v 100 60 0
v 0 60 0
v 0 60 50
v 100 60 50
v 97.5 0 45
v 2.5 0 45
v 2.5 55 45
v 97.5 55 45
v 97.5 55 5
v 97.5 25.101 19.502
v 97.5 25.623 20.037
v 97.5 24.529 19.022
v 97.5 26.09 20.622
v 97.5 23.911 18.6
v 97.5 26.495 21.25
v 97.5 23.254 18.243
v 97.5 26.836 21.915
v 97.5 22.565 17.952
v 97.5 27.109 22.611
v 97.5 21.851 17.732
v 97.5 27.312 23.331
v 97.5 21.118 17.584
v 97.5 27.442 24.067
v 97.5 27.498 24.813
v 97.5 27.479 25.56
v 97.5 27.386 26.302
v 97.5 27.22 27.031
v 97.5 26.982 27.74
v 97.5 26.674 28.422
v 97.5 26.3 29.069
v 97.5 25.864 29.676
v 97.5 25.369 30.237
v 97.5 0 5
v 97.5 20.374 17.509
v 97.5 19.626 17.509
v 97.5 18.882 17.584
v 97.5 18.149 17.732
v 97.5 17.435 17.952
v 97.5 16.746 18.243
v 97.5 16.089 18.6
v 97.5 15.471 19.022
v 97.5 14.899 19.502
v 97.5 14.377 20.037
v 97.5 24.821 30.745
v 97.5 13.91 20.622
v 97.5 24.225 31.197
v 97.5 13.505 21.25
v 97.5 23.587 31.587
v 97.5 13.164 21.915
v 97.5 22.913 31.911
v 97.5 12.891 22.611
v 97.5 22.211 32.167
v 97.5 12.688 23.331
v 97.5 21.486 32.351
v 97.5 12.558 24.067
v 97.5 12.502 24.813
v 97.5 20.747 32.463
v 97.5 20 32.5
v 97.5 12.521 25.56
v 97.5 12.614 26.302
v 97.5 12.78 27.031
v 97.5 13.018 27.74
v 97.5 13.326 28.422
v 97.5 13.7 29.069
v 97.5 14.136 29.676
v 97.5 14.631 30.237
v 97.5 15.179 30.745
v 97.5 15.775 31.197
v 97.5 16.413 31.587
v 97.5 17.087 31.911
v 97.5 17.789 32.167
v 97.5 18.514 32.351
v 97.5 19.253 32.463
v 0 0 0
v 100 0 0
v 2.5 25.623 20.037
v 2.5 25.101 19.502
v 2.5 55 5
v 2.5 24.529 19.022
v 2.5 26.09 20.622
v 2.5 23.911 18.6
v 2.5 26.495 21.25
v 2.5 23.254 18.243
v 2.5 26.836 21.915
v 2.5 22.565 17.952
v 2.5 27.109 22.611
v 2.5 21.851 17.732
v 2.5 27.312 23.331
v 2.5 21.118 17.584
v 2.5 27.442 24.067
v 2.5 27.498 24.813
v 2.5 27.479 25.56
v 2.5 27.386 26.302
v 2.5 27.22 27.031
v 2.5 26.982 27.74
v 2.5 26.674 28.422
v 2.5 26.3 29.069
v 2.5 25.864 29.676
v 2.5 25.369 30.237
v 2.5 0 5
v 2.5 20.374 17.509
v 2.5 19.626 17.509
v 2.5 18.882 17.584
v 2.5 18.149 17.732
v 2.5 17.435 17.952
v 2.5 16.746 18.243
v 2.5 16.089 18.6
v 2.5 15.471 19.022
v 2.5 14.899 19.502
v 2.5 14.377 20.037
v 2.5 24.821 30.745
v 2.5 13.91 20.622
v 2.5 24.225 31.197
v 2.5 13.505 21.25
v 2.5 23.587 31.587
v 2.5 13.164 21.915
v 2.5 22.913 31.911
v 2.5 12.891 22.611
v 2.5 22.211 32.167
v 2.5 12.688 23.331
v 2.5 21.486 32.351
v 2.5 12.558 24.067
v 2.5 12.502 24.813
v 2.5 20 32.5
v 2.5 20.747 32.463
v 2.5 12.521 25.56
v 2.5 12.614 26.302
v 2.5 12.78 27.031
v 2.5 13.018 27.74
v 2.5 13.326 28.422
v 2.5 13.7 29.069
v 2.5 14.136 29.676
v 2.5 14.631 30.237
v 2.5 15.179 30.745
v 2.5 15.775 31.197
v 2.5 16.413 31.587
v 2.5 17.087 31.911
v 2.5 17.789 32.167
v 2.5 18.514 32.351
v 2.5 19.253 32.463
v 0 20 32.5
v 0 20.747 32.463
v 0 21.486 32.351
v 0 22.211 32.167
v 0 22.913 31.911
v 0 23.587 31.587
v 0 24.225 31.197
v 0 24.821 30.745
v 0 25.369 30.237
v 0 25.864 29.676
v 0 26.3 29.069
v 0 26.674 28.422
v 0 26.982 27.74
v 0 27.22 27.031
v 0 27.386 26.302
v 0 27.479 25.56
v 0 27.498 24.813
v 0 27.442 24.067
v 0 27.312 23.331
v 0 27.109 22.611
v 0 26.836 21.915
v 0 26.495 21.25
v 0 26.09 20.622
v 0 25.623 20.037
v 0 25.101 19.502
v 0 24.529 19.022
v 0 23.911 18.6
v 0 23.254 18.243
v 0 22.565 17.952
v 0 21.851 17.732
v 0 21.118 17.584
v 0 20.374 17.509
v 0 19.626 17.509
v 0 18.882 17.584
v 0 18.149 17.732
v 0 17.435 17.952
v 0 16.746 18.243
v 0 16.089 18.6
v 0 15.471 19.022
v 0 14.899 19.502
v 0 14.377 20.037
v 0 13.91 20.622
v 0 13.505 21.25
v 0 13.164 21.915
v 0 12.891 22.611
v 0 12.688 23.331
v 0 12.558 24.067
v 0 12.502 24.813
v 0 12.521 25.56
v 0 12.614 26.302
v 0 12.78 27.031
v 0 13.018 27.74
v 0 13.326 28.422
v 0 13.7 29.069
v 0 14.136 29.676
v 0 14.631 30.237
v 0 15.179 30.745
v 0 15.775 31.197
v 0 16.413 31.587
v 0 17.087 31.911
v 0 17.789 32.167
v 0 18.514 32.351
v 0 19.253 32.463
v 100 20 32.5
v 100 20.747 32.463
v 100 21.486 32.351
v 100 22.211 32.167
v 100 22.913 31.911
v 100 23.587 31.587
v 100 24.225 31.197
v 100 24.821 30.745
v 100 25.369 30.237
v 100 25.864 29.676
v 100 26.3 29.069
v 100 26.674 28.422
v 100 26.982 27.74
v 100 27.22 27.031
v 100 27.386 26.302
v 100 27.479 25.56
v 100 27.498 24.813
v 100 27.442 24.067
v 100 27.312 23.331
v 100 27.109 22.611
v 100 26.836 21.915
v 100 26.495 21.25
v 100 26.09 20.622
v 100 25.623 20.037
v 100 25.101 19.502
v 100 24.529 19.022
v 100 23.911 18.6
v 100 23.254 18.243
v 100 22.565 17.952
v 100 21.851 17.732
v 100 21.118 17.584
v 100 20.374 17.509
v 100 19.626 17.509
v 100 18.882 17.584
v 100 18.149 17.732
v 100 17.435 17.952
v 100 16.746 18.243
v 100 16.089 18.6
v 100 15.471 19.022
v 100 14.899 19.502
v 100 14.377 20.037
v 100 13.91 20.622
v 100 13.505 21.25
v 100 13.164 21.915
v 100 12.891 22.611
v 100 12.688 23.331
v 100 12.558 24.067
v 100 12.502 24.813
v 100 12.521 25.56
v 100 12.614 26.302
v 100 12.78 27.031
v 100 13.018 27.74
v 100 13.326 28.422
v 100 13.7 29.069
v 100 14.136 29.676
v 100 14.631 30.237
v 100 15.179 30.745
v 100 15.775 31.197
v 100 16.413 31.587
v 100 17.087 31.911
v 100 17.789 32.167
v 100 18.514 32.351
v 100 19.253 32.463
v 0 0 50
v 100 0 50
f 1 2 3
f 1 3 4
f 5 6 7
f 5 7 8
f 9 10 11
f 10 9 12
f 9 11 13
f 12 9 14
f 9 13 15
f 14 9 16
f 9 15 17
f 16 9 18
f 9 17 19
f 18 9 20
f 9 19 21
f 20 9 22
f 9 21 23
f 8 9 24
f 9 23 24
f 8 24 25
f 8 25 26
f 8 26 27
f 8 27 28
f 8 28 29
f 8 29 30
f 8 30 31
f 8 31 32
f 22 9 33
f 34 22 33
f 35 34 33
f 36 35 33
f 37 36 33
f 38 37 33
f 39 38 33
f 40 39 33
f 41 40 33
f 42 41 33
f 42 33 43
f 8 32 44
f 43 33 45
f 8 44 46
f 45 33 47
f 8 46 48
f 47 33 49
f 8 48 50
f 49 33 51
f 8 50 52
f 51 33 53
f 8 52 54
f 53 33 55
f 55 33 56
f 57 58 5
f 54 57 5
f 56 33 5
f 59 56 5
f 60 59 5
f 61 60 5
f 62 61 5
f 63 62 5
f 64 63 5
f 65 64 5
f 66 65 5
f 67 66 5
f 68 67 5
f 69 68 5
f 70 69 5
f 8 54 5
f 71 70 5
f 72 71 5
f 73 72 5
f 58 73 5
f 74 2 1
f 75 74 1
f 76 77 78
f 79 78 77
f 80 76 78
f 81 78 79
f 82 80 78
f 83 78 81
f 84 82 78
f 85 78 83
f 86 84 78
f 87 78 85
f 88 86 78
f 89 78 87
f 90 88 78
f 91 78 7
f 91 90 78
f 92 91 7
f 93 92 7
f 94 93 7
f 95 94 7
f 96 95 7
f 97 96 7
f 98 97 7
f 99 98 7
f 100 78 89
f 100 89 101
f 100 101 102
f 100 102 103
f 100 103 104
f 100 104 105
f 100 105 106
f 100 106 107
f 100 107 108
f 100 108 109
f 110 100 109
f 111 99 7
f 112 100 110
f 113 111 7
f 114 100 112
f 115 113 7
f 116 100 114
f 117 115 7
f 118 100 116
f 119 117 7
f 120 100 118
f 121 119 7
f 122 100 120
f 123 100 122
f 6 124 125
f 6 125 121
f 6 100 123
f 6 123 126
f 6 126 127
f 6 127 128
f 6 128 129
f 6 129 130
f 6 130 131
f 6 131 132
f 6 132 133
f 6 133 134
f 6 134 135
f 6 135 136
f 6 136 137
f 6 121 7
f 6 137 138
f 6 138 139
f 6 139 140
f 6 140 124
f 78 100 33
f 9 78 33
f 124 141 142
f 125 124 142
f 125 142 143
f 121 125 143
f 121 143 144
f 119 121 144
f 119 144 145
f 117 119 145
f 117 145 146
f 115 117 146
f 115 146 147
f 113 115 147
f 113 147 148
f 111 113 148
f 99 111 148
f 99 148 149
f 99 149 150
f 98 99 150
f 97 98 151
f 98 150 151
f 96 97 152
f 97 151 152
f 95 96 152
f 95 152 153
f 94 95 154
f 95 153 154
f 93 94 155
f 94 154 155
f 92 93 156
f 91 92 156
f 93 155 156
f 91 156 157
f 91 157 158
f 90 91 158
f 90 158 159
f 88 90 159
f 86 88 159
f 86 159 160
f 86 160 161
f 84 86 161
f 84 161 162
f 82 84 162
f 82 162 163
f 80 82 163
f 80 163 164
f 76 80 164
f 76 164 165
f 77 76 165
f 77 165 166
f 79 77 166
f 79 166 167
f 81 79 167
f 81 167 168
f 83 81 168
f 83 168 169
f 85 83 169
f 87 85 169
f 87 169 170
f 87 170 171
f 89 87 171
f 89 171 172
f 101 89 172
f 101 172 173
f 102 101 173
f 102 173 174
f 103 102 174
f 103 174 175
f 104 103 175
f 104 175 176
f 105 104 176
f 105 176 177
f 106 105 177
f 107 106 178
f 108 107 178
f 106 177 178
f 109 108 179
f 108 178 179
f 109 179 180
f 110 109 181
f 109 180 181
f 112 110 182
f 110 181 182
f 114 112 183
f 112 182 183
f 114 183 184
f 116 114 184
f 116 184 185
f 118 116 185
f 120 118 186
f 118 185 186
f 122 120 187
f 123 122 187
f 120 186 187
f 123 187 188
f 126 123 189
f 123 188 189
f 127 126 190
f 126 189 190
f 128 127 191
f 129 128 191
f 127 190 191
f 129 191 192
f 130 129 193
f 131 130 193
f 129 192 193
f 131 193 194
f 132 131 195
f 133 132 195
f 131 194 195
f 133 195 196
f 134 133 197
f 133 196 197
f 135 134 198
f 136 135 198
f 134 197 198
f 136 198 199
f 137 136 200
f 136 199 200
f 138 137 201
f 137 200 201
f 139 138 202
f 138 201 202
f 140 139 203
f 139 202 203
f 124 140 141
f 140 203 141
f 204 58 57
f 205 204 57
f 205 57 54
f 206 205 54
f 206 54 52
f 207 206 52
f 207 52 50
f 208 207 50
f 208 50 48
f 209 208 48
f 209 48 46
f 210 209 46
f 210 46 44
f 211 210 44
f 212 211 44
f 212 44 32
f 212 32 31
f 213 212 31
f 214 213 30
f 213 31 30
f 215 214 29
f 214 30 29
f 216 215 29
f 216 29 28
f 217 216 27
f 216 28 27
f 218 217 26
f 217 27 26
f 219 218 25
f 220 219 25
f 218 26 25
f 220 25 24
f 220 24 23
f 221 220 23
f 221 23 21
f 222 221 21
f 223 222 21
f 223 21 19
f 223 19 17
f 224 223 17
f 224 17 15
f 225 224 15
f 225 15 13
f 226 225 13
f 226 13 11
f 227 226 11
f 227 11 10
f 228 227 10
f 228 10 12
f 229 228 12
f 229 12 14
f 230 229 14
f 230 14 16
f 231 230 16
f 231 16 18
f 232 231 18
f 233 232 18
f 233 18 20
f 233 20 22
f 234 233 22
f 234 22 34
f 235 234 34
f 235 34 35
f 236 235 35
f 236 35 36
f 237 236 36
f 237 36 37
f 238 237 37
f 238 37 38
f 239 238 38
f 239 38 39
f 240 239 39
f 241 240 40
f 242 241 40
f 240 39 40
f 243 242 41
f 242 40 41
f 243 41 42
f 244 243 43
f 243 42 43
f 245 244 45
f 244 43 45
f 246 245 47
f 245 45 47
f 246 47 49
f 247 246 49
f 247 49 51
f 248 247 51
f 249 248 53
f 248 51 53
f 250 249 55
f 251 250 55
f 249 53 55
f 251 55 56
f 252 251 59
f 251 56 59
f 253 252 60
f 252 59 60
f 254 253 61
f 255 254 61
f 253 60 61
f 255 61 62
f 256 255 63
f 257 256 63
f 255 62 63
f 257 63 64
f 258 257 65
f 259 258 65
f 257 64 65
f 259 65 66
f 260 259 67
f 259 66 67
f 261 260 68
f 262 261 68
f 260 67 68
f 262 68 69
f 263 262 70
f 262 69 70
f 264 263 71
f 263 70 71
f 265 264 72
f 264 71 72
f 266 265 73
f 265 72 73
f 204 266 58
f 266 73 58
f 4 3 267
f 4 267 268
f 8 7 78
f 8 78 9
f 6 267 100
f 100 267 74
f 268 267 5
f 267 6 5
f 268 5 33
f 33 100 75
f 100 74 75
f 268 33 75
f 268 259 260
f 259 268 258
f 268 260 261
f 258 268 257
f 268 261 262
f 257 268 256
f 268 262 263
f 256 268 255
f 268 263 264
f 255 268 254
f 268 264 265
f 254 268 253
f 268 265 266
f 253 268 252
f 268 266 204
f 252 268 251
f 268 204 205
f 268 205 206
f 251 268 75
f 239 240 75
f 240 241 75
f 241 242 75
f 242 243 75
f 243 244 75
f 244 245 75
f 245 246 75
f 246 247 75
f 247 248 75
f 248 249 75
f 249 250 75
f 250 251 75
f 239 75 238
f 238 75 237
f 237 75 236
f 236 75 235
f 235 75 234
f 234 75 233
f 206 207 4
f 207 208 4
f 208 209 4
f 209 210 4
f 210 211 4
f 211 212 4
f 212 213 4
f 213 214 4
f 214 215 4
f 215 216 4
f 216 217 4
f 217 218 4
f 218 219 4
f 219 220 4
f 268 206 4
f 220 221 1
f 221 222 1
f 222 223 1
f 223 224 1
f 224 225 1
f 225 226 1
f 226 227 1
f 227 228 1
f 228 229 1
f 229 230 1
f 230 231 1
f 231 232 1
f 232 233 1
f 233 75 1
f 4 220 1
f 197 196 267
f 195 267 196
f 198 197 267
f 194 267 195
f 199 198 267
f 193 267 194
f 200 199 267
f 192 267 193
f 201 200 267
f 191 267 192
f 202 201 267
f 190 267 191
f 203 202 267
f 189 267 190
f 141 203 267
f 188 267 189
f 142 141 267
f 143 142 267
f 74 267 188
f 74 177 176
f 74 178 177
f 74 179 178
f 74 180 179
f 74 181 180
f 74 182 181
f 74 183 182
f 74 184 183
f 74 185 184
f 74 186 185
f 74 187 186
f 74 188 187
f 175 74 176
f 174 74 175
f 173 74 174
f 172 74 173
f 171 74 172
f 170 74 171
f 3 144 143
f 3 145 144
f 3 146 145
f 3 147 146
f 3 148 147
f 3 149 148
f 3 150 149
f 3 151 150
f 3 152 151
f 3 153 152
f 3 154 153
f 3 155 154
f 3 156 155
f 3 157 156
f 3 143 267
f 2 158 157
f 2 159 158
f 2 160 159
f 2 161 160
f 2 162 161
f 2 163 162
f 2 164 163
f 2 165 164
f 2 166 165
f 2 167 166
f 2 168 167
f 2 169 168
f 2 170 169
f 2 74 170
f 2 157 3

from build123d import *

# Parameters (mm, degrees)
SKETCH1_W           = 100
SKETCH1_H           = 60
BOSS_EXTRUDE1_DEPTH = 50
SKETCH2_W           = 95
SKETCH2_H           = 40
CUT_EXTRUDE1_DEPTH  = 55
SKETCH3_R           = 7.5
CUT_EXTRUDE2_DEPTH  = 101


with BuildPart() as part:
    # Sketch1 → Boss-Extrude1 (new body)
    with BuildSketch(Plane.XY):
        with Locations((50, 30)):
            Rectangle(SKETCH1_W, SKETCH1_H)
    extrude(amount=BOSS_EXTRUDE1_DEPTH)

    # Sketch2 → Cut-Extrude1 (cut)
    with BuildSketch(Plane.XZ):
        with Locations((50, 25)):
            Rectangle(SKETCH2_W, SKETCH2_H)
    extrude(amount=-CUT_EXTRUDE1_DEPTH, mode=Mode.SUBTRACT)

    # Sketch3 → Cut-Extrude2 (cut, through all)
    with BuildSketch(Plane.ZY):
        with Locations((25, 20)):
            Circle(SKETCH3_R)
    extrude(amount=-CUT_EXTRUDE2_DEPTH, mode=Mode.SUBTRACT)


solid = part.part
